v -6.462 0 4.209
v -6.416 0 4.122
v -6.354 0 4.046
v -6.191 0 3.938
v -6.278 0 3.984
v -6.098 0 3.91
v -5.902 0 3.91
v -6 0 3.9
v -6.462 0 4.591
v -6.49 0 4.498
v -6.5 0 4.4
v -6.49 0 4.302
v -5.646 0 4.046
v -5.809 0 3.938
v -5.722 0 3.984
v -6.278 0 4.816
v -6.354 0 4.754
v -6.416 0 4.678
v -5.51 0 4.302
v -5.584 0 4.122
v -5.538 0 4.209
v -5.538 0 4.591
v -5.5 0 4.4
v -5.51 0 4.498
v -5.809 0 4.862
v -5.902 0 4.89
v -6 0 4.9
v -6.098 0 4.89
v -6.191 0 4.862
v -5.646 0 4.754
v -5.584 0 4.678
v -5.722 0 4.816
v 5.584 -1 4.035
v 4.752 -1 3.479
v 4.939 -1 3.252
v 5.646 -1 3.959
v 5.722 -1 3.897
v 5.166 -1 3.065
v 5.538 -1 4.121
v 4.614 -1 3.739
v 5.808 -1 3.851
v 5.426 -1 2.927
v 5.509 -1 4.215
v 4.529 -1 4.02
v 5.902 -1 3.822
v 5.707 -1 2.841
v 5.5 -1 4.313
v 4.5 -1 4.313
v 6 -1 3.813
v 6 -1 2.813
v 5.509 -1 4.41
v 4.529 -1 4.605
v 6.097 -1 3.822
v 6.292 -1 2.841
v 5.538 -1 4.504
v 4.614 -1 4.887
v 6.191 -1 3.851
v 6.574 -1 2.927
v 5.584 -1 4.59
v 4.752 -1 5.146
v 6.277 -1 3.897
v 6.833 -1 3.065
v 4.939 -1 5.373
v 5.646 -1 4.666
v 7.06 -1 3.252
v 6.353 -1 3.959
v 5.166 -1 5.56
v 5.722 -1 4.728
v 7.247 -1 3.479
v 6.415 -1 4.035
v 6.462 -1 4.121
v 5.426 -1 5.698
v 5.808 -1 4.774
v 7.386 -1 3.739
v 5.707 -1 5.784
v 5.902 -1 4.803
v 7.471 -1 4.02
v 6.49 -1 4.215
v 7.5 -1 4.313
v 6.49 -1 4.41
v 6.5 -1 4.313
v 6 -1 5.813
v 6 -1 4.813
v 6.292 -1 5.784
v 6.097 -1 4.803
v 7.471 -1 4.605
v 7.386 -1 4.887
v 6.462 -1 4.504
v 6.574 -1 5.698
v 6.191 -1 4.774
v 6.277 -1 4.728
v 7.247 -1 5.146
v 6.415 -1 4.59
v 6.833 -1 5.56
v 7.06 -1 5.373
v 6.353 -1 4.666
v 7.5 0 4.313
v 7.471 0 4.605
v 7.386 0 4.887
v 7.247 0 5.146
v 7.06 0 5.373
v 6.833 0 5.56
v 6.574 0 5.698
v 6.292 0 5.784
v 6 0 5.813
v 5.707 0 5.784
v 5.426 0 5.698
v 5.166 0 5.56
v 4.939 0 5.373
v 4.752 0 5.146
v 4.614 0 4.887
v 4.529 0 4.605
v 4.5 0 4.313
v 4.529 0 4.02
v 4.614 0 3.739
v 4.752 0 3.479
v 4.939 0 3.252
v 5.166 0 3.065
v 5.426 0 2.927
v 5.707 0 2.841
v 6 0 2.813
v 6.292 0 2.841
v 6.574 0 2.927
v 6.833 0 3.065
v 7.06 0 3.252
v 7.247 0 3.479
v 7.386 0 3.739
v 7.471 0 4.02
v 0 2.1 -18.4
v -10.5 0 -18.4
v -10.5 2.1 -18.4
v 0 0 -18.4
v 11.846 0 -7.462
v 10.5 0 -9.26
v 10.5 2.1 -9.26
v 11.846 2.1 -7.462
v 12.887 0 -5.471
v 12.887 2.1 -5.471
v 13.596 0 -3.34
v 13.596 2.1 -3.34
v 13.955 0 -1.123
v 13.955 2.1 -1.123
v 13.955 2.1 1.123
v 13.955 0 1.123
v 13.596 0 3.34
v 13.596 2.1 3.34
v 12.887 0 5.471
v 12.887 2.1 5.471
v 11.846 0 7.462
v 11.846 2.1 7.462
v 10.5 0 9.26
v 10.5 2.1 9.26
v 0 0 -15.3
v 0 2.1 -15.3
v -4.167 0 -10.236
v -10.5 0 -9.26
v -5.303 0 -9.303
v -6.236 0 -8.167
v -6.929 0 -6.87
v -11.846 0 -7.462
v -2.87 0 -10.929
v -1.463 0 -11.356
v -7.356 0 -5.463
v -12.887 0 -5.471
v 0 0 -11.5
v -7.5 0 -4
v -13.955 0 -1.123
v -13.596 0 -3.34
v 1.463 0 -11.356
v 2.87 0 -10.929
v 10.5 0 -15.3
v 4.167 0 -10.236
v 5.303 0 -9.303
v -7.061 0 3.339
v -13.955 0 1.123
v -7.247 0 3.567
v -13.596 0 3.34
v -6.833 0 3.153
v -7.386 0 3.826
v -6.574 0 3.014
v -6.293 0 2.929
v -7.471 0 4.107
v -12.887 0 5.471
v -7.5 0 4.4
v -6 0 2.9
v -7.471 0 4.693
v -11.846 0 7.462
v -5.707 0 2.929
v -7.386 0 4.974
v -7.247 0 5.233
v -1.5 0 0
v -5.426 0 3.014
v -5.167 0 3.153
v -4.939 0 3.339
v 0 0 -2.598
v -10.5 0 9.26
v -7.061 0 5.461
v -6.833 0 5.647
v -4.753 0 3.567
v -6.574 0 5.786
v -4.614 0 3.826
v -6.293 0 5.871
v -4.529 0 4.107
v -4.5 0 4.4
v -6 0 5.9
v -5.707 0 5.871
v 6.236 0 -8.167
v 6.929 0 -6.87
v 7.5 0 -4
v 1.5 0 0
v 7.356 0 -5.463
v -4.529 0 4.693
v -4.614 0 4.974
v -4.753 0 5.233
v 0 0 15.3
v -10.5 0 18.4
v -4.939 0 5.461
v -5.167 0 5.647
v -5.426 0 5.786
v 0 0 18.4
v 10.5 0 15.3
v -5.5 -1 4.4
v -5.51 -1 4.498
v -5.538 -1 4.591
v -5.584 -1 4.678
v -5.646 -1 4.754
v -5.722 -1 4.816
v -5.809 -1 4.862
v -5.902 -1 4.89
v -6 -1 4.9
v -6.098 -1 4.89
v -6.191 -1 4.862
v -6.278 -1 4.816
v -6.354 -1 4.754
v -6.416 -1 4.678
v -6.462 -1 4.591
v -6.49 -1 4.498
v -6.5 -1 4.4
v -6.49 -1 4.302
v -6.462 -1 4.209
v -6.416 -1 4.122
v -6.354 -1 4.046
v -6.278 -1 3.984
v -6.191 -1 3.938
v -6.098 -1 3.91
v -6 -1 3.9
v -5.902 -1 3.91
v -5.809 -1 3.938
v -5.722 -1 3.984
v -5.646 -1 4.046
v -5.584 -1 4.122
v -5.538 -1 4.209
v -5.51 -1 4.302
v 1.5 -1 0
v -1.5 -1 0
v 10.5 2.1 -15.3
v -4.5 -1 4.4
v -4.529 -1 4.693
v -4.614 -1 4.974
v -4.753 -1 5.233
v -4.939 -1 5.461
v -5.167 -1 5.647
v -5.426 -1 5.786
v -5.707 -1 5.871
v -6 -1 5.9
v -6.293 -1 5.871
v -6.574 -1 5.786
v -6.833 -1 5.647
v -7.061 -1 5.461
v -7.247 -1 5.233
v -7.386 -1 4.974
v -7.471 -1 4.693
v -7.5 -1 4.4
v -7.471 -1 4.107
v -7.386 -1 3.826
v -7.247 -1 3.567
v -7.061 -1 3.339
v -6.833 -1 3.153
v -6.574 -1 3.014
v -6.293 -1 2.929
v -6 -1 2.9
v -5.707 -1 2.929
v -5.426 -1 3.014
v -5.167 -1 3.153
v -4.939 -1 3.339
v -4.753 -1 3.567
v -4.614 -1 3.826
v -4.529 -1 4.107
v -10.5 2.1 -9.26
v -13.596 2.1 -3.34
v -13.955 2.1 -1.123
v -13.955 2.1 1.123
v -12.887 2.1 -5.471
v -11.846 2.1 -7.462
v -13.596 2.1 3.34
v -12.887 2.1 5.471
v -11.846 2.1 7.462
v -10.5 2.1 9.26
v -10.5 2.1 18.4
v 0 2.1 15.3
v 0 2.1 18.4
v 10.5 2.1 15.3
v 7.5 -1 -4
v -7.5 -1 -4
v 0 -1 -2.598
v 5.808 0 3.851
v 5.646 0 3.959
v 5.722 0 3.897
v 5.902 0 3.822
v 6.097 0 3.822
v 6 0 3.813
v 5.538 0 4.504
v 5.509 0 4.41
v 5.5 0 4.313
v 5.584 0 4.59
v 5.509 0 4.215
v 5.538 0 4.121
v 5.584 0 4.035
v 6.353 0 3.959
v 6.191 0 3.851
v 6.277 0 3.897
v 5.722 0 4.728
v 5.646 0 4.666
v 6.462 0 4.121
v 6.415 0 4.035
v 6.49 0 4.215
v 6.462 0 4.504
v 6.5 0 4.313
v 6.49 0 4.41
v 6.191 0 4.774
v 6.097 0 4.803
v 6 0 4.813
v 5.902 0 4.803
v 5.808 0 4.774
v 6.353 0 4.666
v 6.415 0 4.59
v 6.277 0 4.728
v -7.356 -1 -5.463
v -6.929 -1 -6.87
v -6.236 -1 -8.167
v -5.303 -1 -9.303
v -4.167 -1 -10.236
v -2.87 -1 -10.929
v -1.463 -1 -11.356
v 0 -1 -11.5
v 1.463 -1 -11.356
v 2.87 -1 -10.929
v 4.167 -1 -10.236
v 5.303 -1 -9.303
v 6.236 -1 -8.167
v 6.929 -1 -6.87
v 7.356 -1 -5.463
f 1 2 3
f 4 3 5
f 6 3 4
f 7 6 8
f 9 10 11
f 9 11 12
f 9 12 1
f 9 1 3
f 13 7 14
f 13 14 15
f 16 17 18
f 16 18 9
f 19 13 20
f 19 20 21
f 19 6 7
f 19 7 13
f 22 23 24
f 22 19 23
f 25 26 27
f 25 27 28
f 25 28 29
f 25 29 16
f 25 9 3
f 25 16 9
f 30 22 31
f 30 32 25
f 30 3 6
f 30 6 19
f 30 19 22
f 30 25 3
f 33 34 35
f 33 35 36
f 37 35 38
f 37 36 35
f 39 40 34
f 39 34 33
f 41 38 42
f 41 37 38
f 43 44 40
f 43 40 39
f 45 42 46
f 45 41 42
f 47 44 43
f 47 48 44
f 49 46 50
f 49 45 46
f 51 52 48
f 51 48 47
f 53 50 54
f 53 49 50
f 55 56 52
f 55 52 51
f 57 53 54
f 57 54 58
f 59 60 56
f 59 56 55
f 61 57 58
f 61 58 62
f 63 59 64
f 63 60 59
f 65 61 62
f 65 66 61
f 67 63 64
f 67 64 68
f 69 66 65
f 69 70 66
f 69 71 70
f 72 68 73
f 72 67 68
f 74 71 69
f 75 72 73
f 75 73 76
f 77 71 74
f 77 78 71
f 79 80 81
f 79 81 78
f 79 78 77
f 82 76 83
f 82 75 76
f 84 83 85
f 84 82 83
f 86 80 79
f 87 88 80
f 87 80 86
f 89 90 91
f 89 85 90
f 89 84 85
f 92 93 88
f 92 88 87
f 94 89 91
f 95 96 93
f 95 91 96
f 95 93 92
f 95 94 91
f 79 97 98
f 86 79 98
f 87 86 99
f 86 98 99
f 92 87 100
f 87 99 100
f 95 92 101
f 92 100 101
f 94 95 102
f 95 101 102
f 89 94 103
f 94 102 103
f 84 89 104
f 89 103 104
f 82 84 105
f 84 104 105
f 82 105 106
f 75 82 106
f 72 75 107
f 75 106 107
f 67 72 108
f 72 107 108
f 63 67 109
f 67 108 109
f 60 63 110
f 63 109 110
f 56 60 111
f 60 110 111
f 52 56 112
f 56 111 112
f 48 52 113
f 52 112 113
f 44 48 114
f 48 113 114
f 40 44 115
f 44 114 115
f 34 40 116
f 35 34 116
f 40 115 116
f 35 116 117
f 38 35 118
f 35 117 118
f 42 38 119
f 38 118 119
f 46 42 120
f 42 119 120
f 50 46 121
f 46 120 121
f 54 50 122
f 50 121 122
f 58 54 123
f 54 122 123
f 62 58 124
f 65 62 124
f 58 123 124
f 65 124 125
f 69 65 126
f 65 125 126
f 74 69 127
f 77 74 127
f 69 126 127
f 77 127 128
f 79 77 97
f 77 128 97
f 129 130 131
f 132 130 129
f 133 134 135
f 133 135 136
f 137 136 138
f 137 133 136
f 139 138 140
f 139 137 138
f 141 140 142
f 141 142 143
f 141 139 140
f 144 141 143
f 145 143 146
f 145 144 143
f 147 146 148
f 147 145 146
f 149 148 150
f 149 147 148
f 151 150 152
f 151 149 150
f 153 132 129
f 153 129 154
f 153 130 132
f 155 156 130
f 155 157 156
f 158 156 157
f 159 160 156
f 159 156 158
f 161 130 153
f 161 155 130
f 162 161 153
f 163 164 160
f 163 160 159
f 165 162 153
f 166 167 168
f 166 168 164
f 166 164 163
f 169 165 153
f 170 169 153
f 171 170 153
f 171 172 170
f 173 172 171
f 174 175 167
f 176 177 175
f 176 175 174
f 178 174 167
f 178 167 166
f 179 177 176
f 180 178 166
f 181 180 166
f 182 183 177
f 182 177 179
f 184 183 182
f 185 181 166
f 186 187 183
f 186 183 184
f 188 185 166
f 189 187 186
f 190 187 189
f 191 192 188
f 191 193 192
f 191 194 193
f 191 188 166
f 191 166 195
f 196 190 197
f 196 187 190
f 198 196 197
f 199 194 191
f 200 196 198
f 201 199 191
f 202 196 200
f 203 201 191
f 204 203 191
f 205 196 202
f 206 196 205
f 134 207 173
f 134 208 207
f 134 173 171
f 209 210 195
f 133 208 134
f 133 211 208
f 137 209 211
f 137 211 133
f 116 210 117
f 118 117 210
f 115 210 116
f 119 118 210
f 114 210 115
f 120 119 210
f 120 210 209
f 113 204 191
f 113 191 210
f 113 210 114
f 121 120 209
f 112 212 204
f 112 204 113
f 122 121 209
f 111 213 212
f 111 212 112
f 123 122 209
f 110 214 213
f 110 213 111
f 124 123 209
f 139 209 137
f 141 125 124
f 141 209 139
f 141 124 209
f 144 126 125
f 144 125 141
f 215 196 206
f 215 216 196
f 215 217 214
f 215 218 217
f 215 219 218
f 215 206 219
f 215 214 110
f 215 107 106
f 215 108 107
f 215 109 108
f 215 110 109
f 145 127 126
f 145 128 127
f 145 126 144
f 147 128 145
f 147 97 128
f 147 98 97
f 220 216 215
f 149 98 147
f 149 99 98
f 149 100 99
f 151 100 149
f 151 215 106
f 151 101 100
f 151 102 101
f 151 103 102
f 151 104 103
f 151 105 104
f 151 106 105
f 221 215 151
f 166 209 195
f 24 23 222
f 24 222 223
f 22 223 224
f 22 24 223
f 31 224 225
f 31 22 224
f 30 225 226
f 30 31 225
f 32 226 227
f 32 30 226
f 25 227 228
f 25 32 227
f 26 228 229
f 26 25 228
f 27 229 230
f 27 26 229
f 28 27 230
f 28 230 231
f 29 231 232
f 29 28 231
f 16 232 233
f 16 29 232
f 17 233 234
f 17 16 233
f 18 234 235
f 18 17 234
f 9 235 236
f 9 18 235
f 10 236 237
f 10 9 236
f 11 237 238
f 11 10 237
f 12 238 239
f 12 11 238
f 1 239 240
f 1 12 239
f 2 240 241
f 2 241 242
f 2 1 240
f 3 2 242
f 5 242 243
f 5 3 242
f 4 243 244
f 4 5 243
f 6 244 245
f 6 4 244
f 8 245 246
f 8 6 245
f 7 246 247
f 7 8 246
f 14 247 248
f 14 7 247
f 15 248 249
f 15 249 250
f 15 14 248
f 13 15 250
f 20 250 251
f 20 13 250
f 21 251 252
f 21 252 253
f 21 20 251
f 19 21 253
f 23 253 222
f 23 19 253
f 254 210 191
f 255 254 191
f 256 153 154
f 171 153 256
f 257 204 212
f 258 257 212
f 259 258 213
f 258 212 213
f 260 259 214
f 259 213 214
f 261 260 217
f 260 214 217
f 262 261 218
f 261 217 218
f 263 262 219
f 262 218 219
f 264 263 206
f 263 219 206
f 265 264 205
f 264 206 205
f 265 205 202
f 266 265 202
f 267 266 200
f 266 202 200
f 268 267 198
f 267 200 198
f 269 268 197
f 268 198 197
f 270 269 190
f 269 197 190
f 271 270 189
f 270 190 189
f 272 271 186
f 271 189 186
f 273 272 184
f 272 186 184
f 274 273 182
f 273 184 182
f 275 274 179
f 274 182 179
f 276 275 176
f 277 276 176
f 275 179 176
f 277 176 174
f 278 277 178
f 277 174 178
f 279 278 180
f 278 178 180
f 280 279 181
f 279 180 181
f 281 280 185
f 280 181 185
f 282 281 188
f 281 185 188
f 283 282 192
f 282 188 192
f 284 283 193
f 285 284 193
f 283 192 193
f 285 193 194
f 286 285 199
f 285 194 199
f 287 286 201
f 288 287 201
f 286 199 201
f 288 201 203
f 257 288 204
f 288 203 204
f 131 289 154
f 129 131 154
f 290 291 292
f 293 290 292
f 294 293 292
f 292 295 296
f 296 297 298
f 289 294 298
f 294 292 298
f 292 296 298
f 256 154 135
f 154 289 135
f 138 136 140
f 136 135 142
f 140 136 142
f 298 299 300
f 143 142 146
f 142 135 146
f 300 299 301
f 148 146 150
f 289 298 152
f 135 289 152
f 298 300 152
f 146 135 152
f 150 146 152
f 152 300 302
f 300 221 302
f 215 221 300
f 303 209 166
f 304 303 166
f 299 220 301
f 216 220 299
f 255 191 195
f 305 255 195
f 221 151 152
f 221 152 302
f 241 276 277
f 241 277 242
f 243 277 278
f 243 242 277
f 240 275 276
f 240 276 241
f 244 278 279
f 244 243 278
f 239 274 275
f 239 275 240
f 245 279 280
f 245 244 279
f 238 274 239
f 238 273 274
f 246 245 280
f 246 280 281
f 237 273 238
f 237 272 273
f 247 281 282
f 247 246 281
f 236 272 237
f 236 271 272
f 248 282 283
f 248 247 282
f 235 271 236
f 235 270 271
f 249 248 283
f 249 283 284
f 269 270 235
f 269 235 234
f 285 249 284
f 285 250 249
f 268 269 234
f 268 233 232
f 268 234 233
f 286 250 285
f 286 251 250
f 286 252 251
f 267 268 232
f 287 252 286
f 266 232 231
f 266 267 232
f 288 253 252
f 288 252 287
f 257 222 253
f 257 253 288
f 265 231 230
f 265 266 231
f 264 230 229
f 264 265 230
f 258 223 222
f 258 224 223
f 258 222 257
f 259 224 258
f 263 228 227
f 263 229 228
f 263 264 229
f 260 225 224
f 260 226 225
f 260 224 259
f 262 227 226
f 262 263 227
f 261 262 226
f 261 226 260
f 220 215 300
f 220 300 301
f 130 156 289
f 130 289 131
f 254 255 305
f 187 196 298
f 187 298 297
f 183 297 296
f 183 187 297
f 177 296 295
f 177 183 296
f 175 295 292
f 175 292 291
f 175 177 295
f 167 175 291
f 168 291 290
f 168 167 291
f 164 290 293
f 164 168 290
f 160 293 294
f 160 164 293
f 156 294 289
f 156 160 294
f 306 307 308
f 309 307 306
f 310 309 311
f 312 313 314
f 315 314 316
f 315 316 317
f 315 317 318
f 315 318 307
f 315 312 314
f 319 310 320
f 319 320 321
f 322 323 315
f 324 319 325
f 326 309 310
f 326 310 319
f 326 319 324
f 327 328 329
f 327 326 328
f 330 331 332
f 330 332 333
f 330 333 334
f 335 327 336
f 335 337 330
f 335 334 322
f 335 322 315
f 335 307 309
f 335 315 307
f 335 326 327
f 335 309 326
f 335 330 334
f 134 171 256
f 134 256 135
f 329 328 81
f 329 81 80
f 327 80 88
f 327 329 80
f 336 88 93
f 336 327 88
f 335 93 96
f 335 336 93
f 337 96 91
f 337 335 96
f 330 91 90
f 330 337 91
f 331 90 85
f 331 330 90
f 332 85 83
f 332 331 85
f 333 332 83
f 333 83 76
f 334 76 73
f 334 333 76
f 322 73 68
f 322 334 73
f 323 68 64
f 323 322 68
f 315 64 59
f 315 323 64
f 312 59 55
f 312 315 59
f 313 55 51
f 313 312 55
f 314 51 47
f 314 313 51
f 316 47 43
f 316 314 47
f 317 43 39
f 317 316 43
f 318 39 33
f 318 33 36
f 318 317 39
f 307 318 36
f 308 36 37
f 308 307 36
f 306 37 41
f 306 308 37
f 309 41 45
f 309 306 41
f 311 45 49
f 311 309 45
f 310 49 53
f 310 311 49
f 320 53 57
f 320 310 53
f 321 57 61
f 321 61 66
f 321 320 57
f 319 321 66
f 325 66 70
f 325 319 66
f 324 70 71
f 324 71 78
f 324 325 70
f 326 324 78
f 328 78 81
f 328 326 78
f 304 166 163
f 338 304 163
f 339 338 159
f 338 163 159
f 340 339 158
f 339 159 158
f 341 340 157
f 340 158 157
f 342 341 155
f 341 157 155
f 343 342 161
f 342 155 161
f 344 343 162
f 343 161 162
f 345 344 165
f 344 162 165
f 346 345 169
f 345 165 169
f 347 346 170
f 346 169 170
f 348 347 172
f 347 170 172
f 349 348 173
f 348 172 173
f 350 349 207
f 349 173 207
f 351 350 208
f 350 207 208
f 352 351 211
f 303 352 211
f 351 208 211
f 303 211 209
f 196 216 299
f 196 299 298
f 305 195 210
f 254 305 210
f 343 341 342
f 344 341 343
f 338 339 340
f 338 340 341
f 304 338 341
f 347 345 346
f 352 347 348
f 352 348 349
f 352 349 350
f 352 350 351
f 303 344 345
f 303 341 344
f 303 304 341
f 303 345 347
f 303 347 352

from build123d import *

# Parameters (mm, degrees)
F1_DEPTH = 2.1
F4_DEPTH = 1
F7_DEPTH = 1
F2_R     = 1.5
F2_R_2   = 0.5
F8_DEPTH = 1


# Not quite as in the source:
# - a feature names something its author has since deleted; it is built from what else it names
# - the program builds the solid bodies; features that only make, move or delete a surface that nothing else refers to are left out


with BuildPart() as f1:
    # F0 (on Front) → F1 (new body)
    with BuildSketch(Plane.XZ):
        with BuildLine():
            ThreePointArc((-10.5, 9.2601295887), (-14, 0), (-10.5, -9.2601295887))
            Line((-10.5, -9.2601295887), (-10.5, -18.4))
            Line((-10.5, -18.4), (0, -18.4))
            Line((0, -18.4), (0, -15.3))
            Line((0, -15.3), (10.5, -15.3))
            Line((10.5, -15.3), (10.5, -9.2601295887))
            ThreePointArc((10.5, -9.2601295887), (14, 0), (10.5, 9.2601295887))
            Line((10.5, 9.2601295887), (10.5, 15.3))
            Line((10.5, 15.3), (0, 15.3))
            Line((0, 15.3), (0, 18.4))
            Line((0, 18.4), (-10.5, 18.4))
            Line((-10.5, 18.4), (-10.5, 9.2601295887))
        make_face()
    extrude(amount=-F1_DEPTH)

    # F3 (on face) → F4 (join)
    with BuildSketch(Plane.XZ):
        Polygon((1.5, 0), (-1.5, 0), (0, -2.5980762114), align=None)
    extrude(amount=F4_DEPTH)

    # F5 (on face) → F7 (join)
    with BuildSketch(Plane.XZ):
        with BuildLine():
            Line((0, -4), (-7.5, -4))
            ThreePointArc((-7.5, -4), (0, -11.5), (7.5, -4))
            Line((7.5, -4), (0, -4))
        make_face()
    extrude(amount=F7_DEPTH)

    # F2 (on Front) → F8 (join)
    with BuildSketch(Plane.XZ):
        with Locations((-6, 4.4)):
            Circle(F2_R)
        with Locations((-6, 4.4)):
            Circle(F2_R_2, mode=Mode.SUBTRACT)
        with Locations((5.9996811691, 4.3125251973)):
            Circle(F2_R)
        with Locations((5.9996811691, 4.3125251973)):
            Circle(F2_R_2, mode=Mode.SUBTRACT)
    extrude(amount=F8_DEPTH)


solid = f1.part
